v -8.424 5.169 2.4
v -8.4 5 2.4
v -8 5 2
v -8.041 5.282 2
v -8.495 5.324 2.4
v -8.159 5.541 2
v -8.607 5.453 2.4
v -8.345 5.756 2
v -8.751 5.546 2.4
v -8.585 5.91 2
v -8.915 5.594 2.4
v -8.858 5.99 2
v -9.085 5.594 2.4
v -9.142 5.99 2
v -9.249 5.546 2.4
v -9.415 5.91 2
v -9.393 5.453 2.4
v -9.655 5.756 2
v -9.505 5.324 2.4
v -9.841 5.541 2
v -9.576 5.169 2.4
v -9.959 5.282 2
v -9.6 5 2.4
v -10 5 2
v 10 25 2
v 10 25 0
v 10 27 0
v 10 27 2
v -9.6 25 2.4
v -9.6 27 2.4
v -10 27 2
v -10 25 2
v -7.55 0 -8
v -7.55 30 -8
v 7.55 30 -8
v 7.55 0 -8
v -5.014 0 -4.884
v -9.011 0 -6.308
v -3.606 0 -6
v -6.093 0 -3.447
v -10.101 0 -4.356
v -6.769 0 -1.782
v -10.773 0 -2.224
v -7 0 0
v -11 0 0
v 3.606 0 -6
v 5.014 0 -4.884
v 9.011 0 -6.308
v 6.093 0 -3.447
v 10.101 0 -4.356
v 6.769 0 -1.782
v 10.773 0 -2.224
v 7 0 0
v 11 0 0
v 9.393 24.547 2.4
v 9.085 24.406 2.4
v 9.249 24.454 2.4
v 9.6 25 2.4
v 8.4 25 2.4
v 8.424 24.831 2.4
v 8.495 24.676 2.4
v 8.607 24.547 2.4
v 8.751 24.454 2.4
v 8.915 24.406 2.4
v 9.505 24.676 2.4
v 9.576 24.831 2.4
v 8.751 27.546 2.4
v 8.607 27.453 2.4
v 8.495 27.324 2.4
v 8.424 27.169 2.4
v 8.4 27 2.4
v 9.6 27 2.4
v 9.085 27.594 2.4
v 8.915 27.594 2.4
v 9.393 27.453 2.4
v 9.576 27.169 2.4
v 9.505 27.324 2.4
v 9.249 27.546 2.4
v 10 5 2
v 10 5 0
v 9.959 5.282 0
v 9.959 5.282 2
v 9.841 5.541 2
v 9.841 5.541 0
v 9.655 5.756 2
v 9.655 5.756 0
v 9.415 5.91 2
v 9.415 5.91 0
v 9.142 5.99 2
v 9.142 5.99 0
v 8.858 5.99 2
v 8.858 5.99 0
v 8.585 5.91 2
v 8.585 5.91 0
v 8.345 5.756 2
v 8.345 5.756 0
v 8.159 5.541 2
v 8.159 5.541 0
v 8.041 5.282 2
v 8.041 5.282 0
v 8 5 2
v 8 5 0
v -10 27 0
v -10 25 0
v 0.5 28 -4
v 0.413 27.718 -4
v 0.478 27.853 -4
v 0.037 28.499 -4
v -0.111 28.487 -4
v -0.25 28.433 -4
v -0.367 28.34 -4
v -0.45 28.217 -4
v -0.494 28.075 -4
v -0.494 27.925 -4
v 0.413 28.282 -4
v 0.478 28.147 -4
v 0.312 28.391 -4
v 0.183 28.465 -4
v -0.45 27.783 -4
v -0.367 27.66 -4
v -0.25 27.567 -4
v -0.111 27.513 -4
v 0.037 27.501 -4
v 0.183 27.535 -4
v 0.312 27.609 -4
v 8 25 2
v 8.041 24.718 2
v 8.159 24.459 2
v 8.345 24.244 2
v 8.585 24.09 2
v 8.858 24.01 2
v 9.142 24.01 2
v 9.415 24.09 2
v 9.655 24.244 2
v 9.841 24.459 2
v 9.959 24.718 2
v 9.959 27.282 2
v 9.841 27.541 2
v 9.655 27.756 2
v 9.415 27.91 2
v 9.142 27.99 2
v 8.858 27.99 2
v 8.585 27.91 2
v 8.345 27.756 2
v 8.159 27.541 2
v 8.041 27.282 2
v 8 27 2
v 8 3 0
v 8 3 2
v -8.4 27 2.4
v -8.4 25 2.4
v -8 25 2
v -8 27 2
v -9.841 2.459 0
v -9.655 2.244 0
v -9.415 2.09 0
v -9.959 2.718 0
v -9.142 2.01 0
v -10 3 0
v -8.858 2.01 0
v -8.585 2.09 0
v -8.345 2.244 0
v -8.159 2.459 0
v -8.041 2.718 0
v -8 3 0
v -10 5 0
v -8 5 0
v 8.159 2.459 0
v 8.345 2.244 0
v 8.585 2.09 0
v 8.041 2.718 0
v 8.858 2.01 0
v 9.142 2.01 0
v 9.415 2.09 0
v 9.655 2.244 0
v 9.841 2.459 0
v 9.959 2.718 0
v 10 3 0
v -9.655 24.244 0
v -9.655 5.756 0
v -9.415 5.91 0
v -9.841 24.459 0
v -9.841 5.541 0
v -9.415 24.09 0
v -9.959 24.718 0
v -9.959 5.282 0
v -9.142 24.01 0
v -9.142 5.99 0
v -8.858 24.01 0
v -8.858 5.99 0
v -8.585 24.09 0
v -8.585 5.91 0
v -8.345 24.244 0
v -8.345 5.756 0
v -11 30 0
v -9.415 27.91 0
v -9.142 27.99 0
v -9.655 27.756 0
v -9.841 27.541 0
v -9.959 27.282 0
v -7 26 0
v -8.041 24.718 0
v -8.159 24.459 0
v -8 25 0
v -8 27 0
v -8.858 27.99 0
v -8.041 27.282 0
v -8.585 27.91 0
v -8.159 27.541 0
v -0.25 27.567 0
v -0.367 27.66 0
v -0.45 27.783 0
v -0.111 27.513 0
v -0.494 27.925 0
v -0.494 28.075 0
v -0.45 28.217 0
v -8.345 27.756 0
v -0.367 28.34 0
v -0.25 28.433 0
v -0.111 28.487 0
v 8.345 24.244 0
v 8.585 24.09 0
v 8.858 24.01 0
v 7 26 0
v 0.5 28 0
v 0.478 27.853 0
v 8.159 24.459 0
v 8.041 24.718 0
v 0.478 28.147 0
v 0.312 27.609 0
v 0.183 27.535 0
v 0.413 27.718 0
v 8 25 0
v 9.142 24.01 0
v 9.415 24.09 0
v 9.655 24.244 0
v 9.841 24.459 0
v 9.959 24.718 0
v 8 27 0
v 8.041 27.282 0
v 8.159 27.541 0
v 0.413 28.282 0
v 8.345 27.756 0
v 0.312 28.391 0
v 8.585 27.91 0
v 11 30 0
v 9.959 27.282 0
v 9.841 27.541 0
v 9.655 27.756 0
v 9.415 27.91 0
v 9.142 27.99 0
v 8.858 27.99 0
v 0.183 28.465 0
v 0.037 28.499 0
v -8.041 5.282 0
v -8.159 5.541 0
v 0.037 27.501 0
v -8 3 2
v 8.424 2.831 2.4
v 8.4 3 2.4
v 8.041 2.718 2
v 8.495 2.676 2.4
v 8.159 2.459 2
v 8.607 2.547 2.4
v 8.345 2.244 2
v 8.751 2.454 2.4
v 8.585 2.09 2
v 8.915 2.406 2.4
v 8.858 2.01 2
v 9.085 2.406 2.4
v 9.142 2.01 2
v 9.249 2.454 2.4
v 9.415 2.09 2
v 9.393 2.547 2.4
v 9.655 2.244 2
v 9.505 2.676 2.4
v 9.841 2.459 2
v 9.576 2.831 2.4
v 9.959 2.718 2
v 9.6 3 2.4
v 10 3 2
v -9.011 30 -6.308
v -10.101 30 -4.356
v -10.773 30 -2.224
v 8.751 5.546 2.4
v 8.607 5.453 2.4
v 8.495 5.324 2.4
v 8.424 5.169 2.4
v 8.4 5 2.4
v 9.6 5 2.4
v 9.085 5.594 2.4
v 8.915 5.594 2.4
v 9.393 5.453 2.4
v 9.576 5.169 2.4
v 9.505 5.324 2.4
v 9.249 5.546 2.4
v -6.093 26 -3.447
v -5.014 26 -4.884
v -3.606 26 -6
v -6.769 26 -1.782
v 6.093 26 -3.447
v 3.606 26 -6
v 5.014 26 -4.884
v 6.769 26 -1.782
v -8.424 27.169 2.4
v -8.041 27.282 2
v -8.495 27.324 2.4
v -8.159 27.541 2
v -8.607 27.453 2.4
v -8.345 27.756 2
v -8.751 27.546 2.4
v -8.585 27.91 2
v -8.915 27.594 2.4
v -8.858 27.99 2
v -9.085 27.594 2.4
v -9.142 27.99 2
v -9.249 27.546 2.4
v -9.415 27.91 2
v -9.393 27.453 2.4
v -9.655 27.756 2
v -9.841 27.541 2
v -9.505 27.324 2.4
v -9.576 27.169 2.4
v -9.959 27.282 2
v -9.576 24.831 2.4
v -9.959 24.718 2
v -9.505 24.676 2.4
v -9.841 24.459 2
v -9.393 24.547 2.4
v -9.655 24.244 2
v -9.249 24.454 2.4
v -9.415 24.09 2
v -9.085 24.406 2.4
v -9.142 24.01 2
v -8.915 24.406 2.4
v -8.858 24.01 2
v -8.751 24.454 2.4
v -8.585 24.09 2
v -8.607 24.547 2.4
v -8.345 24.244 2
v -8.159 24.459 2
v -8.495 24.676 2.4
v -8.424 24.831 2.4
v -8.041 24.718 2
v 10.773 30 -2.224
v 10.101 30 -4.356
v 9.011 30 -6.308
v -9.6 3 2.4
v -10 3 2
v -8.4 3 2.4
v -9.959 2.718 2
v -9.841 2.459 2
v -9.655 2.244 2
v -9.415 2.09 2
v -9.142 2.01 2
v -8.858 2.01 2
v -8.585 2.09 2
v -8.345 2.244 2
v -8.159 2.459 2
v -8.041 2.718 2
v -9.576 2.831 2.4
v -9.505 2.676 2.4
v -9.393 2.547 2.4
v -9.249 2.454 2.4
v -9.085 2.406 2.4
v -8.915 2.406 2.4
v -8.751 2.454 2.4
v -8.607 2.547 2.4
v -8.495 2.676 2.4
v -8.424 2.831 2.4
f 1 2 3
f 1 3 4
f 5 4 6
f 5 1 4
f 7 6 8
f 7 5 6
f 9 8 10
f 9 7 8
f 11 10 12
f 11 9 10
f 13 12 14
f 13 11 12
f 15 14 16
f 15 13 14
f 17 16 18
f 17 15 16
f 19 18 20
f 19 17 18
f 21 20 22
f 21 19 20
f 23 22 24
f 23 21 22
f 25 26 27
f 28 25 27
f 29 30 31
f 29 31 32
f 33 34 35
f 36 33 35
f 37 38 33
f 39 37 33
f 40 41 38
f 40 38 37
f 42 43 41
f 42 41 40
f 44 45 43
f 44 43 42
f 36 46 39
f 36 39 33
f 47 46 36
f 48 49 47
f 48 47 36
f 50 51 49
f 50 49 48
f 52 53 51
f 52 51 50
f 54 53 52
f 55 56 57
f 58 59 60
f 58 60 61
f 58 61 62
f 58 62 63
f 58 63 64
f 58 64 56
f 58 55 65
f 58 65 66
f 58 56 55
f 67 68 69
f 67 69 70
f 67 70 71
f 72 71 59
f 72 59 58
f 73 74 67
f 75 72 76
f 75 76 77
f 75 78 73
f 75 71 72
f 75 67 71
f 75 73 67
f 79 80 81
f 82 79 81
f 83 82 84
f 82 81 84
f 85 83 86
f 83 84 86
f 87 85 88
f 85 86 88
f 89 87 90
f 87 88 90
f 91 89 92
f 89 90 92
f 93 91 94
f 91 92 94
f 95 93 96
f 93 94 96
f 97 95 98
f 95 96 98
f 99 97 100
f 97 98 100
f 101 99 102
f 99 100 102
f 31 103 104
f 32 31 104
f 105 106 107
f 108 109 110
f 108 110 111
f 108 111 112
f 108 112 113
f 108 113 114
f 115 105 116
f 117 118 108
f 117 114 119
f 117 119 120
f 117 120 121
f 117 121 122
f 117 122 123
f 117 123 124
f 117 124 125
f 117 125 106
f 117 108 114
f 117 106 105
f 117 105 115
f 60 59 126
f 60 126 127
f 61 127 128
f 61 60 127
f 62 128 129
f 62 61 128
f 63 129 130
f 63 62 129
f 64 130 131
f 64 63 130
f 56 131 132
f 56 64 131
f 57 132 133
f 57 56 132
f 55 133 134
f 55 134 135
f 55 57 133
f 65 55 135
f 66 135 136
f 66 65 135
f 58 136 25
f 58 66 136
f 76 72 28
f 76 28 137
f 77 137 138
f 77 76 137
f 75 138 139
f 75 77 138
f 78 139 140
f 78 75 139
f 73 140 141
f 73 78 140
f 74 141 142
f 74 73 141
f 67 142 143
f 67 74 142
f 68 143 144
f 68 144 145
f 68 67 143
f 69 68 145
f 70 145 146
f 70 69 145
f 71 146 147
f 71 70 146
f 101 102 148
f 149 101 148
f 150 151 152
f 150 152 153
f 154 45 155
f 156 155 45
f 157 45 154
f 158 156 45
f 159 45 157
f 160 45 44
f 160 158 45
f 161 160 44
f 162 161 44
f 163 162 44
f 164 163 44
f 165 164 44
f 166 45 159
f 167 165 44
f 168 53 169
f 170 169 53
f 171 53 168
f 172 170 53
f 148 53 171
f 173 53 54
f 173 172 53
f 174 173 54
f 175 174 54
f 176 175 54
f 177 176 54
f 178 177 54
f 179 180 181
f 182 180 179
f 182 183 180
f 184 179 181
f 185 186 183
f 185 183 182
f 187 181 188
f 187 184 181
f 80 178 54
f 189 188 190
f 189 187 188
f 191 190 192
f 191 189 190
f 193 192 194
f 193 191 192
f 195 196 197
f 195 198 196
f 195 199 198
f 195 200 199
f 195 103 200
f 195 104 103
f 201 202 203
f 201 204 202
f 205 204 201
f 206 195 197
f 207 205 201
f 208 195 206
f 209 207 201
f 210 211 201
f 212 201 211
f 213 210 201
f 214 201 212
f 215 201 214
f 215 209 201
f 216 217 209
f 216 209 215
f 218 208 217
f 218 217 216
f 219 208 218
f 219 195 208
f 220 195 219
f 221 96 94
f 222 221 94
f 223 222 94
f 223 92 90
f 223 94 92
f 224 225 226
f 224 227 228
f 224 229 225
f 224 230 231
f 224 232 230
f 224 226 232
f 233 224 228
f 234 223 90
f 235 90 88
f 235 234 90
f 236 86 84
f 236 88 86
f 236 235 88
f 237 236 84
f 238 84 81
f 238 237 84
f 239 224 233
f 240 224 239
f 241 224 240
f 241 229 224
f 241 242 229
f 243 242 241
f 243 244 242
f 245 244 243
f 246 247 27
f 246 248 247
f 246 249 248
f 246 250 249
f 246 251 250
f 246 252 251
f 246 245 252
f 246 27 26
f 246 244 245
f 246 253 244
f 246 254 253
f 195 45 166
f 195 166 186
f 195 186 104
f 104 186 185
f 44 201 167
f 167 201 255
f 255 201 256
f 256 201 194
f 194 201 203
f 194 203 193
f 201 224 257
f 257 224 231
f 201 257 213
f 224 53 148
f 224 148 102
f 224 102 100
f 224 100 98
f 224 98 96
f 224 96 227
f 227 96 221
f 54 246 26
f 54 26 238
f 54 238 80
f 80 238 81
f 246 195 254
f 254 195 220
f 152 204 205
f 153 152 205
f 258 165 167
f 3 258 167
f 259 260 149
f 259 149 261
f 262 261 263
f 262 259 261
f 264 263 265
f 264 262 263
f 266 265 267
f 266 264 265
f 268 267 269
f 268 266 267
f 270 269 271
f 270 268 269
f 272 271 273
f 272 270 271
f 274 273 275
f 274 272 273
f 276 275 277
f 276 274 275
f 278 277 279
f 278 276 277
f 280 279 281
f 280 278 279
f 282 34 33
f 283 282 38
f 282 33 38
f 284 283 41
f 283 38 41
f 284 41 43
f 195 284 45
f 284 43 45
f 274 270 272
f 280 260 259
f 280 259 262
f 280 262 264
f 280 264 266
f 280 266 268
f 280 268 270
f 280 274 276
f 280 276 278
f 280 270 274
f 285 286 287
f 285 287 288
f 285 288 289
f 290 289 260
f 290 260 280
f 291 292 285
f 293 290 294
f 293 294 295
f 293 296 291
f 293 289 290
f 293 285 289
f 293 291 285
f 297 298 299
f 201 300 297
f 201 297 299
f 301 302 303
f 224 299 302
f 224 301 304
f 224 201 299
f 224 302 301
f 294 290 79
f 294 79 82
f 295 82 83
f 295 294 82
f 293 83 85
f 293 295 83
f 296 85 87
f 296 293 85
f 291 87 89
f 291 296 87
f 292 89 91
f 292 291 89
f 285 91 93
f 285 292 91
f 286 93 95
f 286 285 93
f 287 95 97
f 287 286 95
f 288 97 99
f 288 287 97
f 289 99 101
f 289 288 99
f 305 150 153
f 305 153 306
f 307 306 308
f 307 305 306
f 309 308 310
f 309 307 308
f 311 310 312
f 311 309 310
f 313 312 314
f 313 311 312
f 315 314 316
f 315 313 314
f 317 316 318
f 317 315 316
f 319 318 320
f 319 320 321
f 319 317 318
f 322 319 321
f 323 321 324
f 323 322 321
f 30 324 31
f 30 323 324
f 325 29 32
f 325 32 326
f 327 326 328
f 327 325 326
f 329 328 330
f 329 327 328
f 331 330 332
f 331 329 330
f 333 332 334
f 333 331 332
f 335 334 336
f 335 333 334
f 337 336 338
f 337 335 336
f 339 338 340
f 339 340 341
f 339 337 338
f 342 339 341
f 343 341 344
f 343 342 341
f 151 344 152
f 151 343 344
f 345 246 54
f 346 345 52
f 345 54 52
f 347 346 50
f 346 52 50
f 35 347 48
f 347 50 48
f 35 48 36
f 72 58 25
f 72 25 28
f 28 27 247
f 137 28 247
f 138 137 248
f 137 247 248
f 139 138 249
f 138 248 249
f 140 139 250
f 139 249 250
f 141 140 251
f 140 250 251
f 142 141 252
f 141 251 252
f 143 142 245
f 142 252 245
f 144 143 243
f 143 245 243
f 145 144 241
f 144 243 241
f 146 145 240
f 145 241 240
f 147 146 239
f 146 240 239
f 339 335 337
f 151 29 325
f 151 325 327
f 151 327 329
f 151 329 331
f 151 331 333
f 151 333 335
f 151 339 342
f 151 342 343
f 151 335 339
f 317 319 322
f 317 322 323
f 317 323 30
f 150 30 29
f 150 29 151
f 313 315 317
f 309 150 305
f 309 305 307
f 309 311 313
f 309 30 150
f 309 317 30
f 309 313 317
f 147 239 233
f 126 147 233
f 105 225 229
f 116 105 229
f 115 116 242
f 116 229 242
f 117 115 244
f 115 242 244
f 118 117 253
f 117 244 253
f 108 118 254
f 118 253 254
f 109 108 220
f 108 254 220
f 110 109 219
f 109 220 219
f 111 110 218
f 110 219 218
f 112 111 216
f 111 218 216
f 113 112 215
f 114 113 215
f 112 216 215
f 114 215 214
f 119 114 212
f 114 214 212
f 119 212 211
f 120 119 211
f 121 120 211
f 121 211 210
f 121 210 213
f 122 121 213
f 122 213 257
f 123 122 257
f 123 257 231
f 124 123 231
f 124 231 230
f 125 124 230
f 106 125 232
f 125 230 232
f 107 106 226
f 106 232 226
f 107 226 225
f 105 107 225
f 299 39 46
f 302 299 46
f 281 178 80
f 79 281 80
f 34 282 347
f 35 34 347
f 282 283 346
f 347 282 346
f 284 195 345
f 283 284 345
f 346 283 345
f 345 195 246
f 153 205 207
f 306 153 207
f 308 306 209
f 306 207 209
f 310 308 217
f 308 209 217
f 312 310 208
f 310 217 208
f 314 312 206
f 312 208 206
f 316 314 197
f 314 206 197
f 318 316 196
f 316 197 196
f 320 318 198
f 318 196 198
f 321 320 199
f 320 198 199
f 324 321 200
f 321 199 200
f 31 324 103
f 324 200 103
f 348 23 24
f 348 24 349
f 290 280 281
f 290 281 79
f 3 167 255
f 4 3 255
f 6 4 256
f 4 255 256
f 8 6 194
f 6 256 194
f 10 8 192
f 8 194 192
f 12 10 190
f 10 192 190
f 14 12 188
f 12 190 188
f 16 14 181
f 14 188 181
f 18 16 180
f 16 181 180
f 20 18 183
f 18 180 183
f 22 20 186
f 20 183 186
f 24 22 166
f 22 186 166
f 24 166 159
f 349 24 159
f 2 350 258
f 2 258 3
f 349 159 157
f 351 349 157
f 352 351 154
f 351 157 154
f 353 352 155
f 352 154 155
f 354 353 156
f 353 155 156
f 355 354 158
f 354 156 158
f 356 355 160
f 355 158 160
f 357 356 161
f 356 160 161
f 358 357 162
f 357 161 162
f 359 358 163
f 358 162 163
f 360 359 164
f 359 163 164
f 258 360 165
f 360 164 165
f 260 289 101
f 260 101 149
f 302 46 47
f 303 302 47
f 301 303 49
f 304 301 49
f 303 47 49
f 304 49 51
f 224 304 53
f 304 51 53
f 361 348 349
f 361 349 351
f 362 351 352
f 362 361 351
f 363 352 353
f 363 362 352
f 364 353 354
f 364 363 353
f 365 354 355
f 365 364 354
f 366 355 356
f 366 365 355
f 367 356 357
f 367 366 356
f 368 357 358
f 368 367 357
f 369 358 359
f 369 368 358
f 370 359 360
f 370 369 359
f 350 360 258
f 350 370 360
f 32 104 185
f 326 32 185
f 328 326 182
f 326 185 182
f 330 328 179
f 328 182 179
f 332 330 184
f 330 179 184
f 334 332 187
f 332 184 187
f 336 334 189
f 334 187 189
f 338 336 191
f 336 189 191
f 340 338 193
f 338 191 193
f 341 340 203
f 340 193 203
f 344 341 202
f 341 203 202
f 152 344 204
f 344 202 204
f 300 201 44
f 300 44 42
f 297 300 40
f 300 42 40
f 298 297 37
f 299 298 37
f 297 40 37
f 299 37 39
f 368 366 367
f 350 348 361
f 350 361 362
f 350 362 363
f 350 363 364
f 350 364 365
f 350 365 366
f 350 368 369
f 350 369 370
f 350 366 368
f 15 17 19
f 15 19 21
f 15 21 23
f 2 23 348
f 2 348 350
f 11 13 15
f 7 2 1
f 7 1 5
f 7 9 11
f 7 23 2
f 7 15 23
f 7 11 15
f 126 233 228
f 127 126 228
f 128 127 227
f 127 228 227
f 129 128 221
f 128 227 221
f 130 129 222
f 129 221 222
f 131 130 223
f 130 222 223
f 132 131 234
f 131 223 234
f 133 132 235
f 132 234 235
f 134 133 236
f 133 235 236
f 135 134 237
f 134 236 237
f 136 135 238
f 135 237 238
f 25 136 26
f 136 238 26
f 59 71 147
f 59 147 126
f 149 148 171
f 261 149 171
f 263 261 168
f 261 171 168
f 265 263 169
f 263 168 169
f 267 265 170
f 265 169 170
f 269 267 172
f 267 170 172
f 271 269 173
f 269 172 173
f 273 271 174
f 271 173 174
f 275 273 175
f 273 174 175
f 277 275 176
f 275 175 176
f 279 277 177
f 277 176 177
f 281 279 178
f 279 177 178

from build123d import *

# Parameters (mm, degrees)
F1_W      = 22
F1_H      = 30
F2_DEPTH  = 8
F4_DEPTH  = 30.001
F6_DEPTH  = 2.4
F7_SIZE   = 0.4
F9_DEPTH  = 26
F10_R     = 0.5
F11_DEPTH = 4


with BuildPart() as f2:
    # F1 (on Top) → F2 (new body)
    with BuildSketch(Plane.XY):
        with Locations((0, 15)):
            Rectangle(F1_W, F1_H)
    extrude(amount=-F2_DEPTH)

    # F3 (on face) → F4 (cut, through all)
    with BuildSketch(Plane.XZ):
        with BuildLine():
            ThreePointArc((-7.549834, -8), (-10.100697, -4.356135), (-11, 0))
            Line((-11, 0), (-11, -8))
            Line((-11, -8), (-7.549834, -8))
        make_face()
        with BuildLine():
            Line((11, -8), (11, 0))
            ThreePointArc((11, 0), (10.100697, -4.356135), (7.549834, -8))
            Line((7.549834, -8), (11, -8))
        make_face()
    extrude(amount=-F4_DEPTH, mode=Mode.SUBTRACT)

    # F5 (on face) → F6 (join)
    with BuildSketch(Plane.XY):
        with BuildLine():
            ThreePointArc((-8, 5), (-9, 6), (-10, 5))
            Line((-10, 5), (-10, 3))
            ThreePointArc((-10, 3), (-9, 2), (-8, 3))
            Line((-8, 3), (-8, 5))
        make_face()
        with BuildLine():
            ThreePointArc((10, 5), (9, 6), (8, 5))
            Line((8, 5), (8, 3))
            ThreePointArc((8, 3), (9, 2), (10, 3))
            Line((10, 3), (10, 5))
        make_face()
        with BuildLine():
            ThreePointArc((-8, 27), (-9, 28), (-10, 27))
            Line((-10, 27), (-10, 25))
            ThreePointArc((-10, 25), (-9, 24), (-8, 25))
            Line((-8, 25), (-8, 27))
        make_face()
        with BuildLine():
            ThreePointArc((10, 27), (9, 28), (8, 27))
            Line((8, 27), (8, 25))
            ThreePointArc((8, 25), (9, 24), (10, 25))
            Line((10, 25), (10, 27))
        make_face()
    extrude(amount=F6_DEPTH)

    # F7
    f7_edges = [f2.edges().sort_by_distance(p)[0] for p in [
        (-9, 6, 2.4),
        (-10, 4, 2.4),
        (-9, 2, 2.4),
        (-8, 4, 2.4),
        (9, 6, 2.4),
        (8, 4, 2.4),
        (9, 2, 2.4),
        (10, 4, 2.4),
        (-9, 28, 2.4),
        (-10, 26, 2.4),
        (-9, 24, 2.4),
        (-8, 26, 2.4),
        (9, 28, 2.4),
        (8, 26, 2.4),
        (9, 24, 2.4),
        (10, 26, 2.4),
    ]]
    chamfer(f7_edges, length=F7_SIZE)

    # F8 (on face) → F9 (cut)
    with BuildSketch(Plane.XZ):
        with BuildLine():
            Line((7, 0), (-7, 0))
            ThreePointArc((-7, 0), (-6.092572, -3.44682), (-3.605551, -6))
            Line((-3.605551, -6), (3.605551, -6))
            ThreePointArc((3.605551, -6), (6.092572, -3.44682), (7, 0))
        make_face()
    extrude(amount=-F9_DEPTH, mode=Mode.SUBTRACT)

    # F10 (on face) → F11 (cut)
    with BuildSketch(Plane.XY):
        with Locations((0, 28)):
            Circle(F10_R)
    extrude(amount=-F11_DEPTH, mode=Mode.SUBTRACT)


solid = f2.part
